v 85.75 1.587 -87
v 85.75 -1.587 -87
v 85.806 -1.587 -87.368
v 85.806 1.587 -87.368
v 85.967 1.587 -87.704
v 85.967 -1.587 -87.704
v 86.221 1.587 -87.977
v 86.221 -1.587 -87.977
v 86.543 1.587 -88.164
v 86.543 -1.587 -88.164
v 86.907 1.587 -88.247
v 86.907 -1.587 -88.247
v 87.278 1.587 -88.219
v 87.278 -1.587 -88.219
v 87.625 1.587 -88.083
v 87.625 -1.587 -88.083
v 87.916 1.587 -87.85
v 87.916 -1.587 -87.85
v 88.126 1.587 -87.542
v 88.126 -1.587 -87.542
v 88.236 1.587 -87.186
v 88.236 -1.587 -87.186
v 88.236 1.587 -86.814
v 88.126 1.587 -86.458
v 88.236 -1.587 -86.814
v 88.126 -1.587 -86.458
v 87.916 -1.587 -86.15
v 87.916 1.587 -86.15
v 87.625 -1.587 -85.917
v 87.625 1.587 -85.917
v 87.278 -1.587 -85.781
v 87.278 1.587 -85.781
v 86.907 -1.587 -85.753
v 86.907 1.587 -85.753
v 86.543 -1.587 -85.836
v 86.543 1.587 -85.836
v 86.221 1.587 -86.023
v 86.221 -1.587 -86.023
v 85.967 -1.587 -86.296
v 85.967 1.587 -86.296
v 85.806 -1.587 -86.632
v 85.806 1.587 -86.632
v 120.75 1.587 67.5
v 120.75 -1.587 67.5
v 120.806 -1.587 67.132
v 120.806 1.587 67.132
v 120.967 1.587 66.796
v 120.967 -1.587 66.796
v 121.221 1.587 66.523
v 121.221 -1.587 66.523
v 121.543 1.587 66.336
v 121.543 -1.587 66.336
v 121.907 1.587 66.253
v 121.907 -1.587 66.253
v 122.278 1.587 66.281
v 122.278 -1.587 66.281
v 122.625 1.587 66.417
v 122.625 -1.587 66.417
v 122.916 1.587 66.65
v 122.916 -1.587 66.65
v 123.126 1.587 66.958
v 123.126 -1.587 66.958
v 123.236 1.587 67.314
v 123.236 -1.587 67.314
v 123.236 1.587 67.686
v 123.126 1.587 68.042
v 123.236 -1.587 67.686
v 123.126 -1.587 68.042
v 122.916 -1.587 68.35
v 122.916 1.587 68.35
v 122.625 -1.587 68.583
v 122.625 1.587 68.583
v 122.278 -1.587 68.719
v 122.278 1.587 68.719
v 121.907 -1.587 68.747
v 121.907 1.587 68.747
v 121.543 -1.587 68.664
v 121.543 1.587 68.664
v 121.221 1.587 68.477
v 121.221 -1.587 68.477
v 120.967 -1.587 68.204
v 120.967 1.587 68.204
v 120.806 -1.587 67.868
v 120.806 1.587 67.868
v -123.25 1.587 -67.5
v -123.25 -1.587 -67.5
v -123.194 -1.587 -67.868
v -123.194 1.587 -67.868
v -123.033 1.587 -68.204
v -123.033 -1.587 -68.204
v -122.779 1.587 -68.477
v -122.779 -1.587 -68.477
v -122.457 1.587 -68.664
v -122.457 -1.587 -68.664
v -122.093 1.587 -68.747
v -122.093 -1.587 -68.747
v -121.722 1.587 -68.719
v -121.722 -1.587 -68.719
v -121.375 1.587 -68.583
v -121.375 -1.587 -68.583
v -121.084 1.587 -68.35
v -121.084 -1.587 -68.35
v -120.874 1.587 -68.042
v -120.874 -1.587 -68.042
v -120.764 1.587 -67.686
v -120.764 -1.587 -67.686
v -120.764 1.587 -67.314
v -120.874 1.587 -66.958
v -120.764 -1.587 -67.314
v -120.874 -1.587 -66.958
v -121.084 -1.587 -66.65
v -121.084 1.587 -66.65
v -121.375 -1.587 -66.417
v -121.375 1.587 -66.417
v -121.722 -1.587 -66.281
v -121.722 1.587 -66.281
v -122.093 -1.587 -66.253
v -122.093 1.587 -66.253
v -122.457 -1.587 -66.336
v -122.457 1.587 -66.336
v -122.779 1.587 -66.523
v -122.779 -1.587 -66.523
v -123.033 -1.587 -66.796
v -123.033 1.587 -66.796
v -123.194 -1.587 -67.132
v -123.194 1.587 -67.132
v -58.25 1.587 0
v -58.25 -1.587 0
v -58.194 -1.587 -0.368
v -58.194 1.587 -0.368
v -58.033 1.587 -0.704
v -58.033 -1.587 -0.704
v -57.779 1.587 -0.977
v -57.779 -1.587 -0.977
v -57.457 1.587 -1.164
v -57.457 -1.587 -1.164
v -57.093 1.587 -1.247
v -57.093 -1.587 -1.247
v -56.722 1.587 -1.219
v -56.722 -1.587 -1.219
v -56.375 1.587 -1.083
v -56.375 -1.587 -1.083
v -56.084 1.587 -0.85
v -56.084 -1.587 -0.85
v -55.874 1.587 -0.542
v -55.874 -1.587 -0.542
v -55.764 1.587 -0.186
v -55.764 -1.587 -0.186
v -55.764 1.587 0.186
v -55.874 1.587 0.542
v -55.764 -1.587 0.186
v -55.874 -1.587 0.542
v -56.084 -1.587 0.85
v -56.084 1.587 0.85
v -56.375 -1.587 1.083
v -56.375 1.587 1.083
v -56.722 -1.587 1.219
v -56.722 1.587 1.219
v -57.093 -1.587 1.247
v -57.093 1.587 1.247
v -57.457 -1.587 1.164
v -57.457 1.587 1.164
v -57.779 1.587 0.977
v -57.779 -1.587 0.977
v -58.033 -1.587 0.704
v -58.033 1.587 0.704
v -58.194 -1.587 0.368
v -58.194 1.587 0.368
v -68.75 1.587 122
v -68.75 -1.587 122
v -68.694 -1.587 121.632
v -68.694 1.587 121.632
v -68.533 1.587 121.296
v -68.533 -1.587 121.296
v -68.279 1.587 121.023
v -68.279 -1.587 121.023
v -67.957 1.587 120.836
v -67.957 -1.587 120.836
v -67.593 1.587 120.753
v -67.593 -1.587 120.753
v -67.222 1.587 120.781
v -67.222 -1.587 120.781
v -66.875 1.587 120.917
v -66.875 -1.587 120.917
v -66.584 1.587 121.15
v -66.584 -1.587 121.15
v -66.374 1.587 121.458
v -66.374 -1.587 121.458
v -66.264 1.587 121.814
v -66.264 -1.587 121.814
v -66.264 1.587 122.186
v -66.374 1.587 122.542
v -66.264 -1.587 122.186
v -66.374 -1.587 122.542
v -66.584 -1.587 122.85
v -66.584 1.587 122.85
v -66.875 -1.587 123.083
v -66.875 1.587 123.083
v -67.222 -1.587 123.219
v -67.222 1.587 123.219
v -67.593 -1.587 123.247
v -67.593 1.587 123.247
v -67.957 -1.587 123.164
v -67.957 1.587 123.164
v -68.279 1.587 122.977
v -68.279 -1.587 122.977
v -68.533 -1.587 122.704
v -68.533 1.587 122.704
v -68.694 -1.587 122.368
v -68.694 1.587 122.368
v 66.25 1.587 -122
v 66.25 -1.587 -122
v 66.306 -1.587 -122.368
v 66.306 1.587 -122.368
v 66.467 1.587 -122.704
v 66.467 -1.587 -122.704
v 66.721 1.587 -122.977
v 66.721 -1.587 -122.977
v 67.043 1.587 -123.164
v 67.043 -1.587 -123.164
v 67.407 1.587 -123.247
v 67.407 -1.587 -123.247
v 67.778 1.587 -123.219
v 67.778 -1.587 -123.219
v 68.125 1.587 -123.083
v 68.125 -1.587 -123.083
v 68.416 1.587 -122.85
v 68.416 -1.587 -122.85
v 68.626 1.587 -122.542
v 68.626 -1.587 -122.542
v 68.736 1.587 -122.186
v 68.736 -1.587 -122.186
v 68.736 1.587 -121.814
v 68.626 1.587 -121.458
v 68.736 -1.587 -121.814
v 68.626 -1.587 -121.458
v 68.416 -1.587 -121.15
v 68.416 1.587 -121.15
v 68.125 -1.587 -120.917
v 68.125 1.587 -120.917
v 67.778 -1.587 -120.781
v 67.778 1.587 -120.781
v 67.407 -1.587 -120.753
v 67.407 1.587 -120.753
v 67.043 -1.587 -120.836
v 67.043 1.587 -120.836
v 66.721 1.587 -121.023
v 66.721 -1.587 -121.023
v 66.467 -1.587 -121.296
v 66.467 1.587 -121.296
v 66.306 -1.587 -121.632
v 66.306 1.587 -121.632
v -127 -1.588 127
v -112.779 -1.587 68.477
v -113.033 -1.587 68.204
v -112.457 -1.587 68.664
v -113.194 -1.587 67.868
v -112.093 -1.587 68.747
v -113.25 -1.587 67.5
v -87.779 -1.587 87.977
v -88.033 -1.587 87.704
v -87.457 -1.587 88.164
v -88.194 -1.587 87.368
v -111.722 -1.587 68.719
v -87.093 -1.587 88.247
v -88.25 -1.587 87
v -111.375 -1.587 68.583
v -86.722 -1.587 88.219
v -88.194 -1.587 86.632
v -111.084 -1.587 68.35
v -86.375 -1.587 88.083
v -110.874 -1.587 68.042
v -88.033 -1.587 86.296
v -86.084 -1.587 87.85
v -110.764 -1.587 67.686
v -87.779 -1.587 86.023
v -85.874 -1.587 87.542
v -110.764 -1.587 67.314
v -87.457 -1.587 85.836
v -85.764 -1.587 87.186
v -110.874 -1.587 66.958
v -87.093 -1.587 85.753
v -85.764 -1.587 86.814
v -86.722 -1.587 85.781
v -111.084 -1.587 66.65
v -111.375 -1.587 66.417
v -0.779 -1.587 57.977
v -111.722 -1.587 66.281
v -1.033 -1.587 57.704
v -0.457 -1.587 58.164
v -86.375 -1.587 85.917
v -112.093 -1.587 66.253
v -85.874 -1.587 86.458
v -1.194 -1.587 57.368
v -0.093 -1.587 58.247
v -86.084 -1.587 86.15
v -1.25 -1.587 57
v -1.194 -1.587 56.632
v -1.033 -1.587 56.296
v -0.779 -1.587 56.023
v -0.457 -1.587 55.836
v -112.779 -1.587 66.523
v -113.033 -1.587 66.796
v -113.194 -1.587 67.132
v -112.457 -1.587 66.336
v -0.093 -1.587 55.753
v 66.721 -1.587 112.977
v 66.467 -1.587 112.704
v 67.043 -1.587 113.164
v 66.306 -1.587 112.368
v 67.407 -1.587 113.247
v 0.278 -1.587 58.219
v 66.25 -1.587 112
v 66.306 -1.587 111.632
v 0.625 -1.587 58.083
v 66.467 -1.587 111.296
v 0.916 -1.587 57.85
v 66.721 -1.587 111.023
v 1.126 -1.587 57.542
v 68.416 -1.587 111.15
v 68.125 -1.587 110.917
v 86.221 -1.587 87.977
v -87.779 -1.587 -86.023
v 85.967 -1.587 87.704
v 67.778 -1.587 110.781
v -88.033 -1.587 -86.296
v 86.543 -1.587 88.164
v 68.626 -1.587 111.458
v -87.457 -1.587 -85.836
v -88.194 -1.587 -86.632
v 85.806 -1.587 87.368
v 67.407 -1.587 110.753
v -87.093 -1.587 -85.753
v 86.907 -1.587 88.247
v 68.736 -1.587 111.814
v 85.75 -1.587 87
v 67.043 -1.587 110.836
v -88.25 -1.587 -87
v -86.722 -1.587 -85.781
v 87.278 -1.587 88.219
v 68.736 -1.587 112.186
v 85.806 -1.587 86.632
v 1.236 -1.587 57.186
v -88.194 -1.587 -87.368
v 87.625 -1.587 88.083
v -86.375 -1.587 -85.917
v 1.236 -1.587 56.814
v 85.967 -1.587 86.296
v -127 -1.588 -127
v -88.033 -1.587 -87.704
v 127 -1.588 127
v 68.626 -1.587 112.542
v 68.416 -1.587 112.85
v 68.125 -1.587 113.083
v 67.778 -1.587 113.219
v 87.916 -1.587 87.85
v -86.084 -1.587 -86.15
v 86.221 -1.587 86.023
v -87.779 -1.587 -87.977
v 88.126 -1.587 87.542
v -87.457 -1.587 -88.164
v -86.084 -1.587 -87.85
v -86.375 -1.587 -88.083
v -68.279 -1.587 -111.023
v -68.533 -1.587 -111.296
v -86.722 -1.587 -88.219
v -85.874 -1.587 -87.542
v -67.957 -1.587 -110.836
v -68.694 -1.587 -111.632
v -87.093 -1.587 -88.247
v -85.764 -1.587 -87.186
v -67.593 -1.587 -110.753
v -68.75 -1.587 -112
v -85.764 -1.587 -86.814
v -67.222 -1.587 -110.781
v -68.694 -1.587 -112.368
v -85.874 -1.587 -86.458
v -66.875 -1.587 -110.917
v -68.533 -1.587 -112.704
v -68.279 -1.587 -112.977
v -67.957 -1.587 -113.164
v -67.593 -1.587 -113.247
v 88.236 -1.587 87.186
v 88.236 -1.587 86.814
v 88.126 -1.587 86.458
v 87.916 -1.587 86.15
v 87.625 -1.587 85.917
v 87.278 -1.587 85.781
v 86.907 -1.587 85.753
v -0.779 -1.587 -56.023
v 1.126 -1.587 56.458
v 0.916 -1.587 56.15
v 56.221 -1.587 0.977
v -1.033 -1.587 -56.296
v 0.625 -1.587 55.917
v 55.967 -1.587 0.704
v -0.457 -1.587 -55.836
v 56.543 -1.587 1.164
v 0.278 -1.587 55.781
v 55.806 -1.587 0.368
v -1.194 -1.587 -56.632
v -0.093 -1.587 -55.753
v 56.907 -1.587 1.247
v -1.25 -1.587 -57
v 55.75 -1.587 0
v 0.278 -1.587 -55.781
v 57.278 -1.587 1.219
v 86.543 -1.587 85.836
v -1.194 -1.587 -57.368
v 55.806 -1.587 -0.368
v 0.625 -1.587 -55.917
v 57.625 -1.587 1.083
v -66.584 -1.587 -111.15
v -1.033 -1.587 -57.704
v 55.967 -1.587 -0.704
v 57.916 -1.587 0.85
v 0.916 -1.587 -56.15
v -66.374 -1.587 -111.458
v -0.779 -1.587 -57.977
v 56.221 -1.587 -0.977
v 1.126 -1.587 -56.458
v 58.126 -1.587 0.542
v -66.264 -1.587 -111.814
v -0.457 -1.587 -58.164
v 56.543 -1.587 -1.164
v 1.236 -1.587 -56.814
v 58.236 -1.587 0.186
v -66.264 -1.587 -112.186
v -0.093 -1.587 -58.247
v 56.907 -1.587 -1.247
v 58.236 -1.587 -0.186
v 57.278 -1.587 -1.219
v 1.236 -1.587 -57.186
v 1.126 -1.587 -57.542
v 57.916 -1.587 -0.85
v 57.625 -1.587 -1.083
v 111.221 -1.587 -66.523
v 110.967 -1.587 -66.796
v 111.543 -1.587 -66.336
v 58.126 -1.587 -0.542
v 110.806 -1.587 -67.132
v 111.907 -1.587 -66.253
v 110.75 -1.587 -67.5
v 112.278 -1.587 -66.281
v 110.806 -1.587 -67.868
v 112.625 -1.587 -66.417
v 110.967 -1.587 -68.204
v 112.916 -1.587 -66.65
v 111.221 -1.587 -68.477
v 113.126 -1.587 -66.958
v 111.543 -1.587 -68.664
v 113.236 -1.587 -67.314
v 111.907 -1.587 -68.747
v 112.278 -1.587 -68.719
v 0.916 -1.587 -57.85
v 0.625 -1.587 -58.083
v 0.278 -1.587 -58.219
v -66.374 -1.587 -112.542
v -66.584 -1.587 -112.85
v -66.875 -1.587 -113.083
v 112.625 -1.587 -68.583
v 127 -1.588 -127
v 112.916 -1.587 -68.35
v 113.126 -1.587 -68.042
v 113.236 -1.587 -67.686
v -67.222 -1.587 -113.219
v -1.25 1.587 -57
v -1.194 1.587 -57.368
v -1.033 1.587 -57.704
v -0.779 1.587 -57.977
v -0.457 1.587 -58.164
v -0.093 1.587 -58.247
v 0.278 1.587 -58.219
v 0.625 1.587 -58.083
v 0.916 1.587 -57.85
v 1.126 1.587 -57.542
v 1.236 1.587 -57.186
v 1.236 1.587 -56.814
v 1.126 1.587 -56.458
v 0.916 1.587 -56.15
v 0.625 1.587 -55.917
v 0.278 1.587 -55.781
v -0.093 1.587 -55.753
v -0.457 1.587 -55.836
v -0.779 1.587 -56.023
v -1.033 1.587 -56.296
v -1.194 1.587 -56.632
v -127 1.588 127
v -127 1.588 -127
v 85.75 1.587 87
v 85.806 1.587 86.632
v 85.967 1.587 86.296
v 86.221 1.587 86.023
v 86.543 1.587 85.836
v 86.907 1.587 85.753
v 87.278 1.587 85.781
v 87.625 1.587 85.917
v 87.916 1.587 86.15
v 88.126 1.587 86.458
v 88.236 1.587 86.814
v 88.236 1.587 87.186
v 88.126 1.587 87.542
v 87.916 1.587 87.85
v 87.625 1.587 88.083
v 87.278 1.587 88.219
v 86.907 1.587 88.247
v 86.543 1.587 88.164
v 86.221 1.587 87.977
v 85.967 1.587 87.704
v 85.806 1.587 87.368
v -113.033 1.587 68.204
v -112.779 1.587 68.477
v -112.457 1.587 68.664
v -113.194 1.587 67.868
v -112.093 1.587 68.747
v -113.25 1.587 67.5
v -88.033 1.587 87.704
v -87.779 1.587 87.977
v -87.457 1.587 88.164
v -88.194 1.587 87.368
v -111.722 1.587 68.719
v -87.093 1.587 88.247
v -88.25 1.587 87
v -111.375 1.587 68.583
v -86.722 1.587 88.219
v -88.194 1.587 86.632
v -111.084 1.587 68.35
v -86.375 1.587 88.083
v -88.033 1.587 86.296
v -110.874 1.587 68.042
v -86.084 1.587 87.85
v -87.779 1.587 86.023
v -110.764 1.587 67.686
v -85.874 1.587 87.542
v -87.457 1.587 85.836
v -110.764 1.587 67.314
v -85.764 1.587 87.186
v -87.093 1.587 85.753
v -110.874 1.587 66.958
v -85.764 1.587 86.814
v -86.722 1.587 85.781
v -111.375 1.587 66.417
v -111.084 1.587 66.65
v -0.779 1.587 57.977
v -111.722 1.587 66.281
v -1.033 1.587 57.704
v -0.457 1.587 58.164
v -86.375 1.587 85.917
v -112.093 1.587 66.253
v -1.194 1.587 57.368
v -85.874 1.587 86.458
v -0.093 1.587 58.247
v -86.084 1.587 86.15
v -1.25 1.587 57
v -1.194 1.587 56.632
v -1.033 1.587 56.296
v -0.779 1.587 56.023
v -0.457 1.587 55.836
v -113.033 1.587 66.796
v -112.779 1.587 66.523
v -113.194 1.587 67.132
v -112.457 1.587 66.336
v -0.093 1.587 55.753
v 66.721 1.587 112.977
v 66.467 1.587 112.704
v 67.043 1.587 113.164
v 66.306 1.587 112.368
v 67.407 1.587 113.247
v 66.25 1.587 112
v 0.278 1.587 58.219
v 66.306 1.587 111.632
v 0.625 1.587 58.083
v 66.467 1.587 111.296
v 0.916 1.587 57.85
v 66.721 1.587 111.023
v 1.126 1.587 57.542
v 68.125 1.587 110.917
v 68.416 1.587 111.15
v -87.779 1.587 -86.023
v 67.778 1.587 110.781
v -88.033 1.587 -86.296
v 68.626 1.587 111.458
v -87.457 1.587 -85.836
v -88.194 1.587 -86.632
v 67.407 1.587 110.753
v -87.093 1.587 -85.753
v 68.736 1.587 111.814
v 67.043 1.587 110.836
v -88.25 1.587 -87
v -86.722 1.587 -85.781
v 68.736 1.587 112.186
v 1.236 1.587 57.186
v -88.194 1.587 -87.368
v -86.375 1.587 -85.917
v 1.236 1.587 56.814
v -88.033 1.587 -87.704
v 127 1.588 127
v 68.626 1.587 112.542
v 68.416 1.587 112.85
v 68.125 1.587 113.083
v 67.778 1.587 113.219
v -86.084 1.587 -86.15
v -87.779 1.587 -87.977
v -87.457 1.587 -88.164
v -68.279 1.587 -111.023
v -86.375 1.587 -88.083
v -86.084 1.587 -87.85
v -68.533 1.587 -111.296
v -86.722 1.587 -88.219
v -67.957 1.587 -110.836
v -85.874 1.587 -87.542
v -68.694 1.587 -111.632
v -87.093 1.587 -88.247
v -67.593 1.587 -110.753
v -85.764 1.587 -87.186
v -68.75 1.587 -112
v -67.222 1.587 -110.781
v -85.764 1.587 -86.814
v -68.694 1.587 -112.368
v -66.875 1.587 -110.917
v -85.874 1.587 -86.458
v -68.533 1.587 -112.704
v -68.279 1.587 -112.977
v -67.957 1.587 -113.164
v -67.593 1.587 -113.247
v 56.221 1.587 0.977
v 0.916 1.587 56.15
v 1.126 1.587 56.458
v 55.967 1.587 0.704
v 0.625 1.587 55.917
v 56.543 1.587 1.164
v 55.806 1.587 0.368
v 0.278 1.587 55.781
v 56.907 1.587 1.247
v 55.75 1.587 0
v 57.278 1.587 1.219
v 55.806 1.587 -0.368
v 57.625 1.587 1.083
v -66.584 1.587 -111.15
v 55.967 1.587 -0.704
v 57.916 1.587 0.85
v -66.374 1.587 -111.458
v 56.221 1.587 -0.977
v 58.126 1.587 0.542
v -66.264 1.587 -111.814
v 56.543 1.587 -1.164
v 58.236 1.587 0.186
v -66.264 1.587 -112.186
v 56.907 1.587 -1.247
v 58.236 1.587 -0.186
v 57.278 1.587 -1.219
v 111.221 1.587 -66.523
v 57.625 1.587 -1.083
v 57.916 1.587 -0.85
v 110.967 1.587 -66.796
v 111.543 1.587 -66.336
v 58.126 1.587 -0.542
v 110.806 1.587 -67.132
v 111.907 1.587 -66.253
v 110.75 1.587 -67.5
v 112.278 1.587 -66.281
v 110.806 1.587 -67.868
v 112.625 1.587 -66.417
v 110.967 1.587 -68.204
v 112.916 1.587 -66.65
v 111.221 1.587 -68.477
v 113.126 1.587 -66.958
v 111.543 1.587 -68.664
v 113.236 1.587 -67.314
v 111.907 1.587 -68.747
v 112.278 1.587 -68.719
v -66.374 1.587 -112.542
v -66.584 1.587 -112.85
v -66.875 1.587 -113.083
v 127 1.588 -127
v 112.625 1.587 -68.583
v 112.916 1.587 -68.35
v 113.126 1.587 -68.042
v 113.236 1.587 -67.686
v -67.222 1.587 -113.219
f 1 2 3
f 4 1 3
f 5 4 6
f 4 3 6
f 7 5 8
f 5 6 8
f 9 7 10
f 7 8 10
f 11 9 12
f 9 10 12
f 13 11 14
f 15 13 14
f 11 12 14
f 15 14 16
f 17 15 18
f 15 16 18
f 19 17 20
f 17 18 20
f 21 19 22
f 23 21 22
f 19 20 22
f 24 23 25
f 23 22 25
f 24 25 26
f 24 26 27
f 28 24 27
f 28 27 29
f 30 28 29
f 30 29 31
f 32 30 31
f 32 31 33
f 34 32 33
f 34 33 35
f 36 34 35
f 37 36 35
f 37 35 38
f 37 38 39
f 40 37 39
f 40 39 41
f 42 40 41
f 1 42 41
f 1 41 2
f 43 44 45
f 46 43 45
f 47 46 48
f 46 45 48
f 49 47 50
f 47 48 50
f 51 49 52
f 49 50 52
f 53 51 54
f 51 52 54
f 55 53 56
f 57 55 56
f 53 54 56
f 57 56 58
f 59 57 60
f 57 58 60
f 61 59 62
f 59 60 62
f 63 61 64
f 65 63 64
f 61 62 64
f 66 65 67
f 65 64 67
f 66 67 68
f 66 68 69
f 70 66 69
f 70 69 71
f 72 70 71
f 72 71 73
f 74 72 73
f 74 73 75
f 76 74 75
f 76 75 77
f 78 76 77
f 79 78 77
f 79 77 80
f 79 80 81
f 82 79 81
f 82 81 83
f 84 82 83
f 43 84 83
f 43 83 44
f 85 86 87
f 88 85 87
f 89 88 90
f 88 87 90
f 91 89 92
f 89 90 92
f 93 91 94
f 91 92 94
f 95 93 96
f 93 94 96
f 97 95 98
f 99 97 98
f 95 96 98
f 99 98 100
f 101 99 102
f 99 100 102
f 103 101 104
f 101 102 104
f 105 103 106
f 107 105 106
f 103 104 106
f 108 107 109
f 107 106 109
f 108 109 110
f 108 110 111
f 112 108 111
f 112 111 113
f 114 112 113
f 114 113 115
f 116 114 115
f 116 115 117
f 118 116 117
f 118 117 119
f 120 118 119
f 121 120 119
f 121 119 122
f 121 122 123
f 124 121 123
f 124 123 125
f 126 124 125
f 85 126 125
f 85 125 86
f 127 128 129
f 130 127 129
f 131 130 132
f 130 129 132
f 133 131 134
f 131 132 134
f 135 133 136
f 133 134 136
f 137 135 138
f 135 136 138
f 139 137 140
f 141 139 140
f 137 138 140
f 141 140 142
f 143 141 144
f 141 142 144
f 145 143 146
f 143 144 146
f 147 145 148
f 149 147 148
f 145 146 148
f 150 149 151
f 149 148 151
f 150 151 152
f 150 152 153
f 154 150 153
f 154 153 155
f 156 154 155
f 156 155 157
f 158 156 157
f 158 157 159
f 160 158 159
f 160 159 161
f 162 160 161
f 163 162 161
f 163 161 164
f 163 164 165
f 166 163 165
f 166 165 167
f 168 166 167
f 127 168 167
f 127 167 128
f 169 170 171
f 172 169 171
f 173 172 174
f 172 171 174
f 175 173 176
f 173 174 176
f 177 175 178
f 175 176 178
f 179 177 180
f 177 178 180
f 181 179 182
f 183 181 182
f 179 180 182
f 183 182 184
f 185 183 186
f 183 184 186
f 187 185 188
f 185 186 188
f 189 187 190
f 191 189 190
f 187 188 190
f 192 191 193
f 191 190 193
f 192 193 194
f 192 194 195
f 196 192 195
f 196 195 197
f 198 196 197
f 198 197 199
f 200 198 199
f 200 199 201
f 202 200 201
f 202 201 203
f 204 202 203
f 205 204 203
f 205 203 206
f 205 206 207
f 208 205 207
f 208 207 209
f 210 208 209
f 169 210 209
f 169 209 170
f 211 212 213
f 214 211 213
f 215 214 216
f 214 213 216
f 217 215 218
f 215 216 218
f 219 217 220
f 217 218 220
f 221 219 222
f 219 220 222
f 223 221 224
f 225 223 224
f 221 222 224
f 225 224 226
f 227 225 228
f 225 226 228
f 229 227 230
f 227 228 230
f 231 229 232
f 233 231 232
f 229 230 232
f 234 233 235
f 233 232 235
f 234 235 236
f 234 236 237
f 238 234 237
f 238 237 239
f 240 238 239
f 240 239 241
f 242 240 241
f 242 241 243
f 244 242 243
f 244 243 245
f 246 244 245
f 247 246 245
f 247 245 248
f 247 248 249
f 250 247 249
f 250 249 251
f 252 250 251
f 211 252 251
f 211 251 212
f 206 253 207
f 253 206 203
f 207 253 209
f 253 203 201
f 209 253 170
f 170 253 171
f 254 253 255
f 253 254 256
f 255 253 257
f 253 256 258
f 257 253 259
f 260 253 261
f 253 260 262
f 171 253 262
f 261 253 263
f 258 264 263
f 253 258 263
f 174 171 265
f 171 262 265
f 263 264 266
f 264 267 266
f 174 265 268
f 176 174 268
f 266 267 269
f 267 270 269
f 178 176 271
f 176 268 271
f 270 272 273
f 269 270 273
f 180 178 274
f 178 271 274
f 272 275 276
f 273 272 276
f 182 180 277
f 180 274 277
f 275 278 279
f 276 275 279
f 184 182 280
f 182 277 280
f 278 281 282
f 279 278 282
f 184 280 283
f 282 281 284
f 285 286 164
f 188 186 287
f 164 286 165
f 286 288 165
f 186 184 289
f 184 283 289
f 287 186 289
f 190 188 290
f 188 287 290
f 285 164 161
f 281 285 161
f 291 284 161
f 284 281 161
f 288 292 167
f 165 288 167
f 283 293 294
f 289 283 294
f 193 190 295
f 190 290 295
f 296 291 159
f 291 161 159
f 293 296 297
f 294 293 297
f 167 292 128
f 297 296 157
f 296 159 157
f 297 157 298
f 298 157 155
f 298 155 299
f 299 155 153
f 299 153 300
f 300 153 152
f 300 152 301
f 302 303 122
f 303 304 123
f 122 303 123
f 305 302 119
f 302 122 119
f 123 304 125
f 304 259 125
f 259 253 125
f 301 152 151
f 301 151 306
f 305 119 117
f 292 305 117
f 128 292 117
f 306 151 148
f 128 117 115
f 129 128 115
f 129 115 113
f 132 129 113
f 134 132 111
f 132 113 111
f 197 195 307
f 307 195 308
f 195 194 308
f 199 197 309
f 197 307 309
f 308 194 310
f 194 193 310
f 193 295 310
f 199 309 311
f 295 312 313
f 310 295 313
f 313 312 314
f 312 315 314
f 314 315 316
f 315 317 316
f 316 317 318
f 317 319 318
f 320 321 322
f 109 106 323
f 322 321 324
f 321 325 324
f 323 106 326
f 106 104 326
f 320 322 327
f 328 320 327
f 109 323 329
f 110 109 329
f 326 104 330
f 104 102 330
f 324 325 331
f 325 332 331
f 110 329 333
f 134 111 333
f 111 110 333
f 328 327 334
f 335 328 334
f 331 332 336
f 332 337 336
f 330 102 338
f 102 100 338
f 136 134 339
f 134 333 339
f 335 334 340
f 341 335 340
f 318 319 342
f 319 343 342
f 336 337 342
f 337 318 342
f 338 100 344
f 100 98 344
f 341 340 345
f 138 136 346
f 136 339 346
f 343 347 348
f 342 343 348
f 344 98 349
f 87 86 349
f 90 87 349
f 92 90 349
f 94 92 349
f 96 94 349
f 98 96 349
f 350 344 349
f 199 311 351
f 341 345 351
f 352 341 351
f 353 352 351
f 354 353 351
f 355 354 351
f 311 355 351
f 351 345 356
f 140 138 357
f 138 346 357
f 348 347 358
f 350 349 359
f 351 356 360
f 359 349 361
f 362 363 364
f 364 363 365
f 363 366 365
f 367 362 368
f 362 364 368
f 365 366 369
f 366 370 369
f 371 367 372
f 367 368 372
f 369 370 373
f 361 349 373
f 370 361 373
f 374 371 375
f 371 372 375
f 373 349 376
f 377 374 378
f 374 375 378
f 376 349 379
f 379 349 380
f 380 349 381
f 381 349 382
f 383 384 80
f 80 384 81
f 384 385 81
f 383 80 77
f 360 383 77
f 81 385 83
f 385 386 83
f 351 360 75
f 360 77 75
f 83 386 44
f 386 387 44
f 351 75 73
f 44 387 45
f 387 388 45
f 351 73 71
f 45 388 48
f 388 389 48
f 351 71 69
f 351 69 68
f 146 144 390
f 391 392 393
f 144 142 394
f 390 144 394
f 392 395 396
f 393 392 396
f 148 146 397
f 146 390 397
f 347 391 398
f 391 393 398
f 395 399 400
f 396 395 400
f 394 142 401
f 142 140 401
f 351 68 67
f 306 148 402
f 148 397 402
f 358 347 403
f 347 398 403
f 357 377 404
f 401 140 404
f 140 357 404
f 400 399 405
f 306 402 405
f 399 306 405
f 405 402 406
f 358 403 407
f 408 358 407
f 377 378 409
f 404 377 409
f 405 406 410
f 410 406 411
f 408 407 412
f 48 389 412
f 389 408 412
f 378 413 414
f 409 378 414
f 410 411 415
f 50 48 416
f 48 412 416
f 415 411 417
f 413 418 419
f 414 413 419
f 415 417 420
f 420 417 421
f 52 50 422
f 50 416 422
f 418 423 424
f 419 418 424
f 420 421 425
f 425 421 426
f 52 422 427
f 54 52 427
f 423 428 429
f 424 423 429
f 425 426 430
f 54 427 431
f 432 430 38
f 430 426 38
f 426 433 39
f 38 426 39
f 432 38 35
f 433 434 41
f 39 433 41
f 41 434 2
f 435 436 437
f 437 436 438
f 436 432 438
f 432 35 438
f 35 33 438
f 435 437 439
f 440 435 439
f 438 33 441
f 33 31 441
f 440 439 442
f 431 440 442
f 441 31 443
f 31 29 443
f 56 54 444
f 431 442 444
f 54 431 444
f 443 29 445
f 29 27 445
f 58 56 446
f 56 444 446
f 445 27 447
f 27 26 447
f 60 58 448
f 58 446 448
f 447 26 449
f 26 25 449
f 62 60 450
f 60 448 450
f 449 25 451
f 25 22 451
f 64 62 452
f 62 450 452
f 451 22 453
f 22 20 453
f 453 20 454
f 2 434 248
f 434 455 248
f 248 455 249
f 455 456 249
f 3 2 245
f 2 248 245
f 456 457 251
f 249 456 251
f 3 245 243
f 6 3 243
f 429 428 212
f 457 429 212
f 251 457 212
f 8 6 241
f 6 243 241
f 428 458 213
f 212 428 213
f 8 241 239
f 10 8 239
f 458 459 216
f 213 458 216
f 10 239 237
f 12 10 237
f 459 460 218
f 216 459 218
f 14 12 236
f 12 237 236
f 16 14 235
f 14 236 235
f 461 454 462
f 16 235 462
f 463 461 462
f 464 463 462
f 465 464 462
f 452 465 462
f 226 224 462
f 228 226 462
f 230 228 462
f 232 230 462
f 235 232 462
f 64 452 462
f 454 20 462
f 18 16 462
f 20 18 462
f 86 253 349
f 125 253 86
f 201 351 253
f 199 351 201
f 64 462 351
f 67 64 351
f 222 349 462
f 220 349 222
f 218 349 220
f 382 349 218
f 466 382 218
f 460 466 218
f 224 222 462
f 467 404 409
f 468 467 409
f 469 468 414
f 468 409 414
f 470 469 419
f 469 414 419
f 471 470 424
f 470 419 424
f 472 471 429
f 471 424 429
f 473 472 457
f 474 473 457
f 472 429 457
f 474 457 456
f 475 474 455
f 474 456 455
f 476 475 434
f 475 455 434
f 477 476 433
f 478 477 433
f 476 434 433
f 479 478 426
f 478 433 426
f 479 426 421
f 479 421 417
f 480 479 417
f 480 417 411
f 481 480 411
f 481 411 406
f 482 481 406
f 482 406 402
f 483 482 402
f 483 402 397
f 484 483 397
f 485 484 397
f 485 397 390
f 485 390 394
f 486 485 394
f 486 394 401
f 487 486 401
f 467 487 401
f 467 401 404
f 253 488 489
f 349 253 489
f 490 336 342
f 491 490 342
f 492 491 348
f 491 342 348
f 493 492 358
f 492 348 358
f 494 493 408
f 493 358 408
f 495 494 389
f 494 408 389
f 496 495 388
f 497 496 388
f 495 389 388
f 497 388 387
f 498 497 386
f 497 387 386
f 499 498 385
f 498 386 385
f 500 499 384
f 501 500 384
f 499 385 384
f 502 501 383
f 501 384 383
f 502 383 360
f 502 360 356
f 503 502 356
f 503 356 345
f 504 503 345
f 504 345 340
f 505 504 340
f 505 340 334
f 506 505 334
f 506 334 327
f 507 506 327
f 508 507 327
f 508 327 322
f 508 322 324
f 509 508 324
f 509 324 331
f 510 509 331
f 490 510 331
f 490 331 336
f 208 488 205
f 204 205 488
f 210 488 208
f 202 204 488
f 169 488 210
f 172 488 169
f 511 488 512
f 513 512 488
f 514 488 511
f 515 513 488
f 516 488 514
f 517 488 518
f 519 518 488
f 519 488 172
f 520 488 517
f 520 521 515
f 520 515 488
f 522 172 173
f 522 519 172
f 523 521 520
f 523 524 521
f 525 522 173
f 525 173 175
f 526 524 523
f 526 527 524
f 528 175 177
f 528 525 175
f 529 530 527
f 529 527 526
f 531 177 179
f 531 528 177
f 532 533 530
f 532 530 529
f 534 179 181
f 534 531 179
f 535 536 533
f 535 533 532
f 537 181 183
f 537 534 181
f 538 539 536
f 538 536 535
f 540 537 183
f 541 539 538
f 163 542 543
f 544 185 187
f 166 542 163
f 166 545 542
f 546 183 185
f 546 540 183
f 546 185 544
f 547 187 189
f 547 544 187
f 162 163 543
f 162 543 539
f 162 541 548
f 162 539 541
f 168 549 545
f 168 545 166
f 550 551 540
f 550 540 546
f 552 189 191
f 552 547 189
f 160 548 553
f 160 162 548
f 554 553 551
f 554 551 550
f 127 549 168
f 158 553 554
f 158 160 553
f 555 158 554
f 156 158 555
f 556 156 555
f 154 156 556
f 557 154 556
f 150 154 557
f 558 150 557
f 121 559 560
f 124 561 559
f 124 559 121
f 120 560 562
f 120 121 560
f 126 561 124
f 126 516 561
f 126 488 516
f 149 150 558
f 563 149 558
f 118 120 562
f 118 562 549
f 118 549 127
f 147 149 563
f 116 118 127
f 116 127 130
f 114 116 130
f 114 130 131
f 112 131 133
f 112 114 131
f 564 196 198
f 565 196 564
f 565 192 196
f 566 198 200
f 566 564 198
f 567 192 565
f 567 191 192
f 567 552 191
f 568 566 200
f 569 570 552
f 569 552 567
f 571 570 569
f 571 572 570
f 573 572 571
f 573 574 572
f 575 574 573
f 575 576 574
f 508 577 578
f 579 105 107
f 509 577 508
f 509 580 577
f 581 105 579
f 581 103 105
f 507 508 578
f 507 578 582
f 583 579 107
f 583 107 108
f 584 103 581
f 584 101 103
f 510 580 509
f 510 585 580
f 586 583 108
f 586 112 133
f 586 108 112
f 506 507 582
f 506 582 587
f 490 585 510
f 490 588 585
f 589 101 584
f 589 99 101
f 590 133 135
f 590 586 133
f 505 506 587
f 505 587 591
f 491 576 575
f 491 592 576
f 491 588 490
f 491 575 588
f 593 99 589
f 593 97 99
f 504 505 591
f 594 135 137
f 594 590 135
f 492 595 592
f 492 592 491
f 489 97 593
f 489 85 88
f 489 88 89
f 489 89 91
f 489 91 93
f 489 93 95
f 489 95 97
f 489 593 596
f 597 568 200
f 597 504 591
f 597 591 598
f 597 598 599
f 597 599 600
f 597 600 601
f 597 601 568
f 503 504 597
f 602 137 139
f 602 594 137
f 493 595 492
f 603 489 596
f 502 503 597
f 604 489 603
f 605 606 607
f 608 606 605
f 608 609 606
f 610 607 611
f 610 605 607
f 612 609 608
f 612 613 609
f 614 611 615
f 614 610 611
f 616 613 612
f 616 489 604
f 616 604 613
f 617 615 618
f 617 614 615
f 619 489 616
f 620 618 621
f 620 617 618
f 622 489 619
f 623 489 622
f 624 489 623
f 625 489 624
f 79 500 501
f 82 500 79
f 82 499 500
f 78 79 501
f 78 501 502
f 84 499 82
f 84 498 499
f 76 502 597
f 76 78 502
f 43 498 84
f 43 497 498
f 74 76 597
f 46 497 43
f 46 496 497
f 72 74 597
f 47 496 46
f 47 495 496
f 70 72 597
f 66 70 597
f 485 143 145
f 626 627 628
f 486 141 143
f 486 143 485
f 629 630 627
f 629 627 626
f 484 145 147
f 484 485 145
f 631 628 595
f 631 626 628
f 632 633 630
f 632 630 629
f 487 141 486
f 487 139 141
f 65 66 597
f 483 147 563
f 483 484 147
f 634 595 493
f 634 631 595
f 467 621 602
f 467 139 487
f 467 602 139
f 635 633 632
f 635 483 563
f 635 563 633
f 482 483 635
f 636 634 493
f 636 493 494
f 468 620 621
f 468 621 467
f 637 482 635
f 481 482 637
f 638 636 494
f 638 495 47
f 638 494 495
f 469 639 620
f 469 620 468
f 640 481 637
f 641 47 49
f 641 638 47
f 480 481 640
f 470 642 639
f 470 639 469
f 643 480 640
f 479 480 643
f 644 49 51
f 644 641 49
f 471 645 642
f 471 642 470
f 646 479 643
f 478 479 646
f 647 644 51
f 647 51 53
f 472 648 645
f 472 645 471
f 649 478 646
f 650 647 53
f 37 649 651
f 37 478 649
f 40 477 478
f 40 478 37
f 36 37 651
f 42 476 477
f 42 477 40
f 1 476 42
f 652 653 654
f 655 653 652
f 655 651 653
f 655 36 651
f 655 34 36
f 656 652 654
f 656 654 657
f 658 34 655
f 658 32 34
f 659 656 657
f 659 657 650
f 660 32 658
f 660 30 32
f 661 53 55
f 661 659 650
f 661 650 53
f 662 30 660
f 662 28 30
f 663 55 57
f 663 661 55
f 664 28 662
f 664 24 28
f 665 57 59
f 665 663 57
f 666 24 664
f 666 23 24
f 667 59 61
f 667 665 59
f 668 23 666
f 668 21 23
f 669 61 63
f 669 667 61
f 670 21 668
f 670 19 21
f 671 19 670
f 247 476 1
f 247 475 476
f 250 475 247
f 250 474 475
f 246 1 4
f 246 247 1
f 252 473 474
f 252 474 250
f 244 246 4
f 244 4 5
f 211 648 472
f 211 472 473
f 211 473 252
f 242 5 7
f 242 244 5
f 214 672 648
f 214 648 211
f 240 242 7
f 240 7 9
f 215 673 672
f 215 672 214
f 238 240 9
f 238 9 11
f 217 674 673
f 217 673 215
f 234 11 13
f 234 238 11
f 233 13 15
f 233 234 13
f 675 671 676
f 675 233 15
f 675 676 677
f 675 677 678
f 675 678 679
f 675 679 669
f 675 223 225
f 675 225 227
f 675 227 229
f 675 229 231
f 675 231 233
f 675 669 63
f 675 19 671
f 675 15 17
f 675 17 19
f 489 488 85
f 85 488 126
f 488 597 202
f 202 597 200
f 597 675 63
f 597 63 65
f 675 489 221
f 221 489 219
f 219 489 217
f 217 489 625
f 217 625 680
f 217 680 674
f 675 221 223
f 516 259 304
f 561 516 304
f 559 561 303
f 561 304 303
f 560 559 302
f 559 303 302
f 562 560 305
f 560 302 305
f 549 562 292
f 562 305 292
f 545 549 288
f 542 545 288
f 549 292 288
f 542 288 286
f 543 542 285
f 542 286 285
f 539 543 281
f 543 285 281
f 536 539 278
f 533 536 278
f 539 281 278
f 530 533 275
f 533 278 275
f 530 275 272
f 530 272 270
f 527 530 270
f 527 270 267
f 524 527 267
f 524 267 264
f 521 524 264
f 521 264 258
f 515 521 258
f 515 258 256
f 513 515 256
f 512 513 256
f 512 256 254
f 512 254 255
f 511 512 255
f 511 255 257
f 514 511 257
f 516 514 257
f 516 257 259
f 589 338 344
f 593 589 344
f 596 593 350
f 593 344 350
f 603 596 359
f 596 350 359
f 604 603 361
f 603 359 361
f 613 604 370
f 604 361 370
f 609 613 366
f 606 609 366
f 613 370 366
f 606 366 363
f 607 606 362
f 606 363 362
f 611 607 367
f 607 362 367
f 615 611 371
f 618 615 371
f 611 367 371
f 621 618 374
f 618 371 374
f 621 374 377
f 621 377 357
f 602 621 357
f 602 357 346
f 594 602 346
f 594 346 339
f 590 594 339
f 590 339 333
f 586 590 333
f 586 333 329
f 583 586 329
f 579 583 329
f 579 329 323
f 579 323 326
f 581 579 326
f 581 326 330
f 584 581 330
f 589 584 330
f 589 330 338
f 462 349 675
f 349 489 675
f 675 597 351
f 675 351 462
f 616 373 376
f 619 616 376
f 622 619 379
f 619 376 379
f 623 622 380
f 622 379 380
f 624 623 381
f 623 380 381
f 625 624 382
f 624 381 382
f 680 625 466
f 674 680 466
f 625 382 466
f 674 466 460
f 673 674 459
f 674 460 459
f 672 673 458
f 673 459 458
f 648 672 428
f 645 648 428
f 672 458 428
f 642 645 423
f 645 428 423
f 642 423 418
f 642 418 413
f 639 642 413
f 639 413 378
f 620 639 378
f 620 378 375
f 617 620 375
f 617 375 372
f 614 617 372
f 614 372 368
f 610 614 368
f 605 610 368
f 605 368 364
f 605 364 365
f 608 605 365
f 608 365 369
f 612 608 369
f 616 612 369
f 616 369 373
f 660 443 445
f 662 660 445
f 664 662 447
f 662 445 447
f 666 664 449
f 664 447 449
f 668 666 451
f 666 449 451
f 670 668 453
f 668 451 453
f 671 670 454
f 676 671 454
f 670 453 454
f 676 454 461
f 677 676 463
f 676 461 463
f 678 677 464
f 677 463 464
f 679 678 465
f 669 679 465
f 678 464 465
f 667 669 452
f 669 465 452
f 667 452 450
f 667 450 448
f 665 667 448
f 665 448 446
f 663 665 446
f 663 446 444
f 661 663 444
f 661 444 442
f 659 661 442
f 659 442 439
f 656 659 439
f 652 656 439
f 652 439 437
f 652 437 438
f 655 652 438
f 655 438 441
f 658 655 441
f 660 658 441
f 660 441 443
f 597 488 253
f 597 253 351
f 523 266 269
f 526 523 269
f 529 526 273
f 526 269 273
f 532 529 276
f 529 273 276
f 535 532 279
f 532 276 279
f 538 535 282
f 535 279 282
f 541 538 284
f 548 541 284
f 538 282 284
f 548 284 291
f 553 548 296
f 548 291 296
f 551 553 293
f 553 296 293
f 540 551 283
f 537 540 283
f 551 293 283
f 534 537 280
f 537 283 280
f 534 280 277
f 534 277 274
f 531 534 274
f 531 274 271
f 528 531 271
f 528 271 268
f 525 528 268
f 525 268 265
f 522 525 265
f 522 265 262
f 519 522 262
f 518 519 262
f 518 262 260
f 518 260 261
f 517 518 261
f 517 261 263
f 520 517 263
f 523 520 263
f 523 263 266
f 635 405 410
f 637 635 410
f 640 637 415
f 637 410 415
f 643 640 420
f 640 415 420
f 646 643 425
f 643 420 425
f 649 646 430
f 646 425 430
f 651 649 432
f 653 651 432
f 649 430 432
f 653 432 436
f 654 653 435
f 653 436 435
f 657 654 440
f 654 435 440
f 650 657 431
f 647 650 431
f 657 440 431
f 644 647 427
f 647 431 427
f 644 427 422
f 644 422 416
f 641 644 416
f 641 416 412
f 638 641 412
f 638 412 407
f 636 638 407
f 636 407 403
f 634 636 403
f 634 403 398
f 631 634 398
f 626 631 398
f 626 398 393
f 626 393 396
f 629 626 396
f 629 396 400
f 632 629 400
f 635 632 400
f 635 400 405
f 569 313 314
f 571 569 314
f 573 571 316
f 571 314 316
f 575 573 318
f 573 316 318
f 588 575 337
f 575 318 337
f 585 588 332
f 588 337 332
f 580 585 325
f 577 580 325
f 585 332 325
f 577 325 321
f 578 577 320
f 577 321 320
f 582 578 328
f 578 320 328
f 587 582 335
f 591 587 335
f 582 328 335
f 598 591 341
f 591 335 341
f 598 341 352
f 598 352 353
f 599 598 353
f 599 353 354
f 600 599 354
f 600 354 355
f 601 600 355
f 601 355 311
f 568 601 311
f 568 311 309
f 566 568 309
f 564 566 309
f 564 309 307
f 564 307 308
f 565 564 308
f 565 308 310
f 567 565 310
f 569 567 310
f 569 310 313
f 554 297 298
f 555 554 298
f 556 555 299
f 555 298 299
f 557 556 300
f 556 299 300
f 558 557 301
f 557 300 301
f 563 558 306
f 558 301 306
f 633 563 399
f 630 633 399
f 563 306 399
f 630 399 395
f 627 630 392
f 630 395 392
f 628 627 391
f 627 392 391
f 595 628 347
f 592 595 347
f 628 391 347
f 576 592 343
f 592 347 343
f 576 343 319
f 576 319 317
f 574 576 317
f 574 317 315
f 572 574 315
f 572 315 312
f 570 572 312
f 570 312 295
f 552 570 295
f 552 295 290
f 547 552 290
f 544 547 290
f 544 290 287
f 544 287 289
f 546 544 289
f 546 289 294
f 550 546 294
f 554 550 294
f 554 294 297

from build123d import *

# Parameters (mm, degrees)
SKETCH1_W             = 254
SKETCH1_H             = 254
BOSS_EXTRUDE1_DEPTH   = 1.5875
M3X0_5_TAPPED_HOLE1_D = 2.5
M3X0_5_TAPPED_HOLE3_D = 2.5


with BuildPart() as part:
    # Sketch1 → Boss-Extrude1 (new, symmetric)
    with BuildSketch(Plane(origin=(0, 0, 0), x_dir=(1, 0, 0), z_dir=(0, 1, 0))):
        Rectangle(SKETCH1_W, SKETCH1_H)
    extrude(amount=BOSS_EXTRUDE1_DEPTH, both=True)

    # M3x0.5 Tapped Hole1 (through all)
    with Locations(Plane(origin=(0, 1.5875, 0), x_dir=(1, 0, 0), z_dir=(0, 1, 0))):
        with Locations((112, 67.5), (67.5, 122), (-67.5, 112), (-122, 67.5), (-112, -67.5), (-67.5, -122), (67.5, -112), (122, -67.5)):
            Hole(M3X0_5_TAPPED_HOLE1_D / 2)

    # M3x0.5 Tapped Hole3 (through all)
    with Locations(Plane(origin=(0, 1.5875, 0), x_dir=(1, 0, 0), z_dir=(0, 1, 0))):
        with Locations((0, 57), (-57, 0), (0, -57), (57, 0), (87, 87), (-87, 87), (-87, -87), (87, -87)):
            Hole(M3X0_5_TAPPED_HOLE3_D / 2)


solid = part.part
